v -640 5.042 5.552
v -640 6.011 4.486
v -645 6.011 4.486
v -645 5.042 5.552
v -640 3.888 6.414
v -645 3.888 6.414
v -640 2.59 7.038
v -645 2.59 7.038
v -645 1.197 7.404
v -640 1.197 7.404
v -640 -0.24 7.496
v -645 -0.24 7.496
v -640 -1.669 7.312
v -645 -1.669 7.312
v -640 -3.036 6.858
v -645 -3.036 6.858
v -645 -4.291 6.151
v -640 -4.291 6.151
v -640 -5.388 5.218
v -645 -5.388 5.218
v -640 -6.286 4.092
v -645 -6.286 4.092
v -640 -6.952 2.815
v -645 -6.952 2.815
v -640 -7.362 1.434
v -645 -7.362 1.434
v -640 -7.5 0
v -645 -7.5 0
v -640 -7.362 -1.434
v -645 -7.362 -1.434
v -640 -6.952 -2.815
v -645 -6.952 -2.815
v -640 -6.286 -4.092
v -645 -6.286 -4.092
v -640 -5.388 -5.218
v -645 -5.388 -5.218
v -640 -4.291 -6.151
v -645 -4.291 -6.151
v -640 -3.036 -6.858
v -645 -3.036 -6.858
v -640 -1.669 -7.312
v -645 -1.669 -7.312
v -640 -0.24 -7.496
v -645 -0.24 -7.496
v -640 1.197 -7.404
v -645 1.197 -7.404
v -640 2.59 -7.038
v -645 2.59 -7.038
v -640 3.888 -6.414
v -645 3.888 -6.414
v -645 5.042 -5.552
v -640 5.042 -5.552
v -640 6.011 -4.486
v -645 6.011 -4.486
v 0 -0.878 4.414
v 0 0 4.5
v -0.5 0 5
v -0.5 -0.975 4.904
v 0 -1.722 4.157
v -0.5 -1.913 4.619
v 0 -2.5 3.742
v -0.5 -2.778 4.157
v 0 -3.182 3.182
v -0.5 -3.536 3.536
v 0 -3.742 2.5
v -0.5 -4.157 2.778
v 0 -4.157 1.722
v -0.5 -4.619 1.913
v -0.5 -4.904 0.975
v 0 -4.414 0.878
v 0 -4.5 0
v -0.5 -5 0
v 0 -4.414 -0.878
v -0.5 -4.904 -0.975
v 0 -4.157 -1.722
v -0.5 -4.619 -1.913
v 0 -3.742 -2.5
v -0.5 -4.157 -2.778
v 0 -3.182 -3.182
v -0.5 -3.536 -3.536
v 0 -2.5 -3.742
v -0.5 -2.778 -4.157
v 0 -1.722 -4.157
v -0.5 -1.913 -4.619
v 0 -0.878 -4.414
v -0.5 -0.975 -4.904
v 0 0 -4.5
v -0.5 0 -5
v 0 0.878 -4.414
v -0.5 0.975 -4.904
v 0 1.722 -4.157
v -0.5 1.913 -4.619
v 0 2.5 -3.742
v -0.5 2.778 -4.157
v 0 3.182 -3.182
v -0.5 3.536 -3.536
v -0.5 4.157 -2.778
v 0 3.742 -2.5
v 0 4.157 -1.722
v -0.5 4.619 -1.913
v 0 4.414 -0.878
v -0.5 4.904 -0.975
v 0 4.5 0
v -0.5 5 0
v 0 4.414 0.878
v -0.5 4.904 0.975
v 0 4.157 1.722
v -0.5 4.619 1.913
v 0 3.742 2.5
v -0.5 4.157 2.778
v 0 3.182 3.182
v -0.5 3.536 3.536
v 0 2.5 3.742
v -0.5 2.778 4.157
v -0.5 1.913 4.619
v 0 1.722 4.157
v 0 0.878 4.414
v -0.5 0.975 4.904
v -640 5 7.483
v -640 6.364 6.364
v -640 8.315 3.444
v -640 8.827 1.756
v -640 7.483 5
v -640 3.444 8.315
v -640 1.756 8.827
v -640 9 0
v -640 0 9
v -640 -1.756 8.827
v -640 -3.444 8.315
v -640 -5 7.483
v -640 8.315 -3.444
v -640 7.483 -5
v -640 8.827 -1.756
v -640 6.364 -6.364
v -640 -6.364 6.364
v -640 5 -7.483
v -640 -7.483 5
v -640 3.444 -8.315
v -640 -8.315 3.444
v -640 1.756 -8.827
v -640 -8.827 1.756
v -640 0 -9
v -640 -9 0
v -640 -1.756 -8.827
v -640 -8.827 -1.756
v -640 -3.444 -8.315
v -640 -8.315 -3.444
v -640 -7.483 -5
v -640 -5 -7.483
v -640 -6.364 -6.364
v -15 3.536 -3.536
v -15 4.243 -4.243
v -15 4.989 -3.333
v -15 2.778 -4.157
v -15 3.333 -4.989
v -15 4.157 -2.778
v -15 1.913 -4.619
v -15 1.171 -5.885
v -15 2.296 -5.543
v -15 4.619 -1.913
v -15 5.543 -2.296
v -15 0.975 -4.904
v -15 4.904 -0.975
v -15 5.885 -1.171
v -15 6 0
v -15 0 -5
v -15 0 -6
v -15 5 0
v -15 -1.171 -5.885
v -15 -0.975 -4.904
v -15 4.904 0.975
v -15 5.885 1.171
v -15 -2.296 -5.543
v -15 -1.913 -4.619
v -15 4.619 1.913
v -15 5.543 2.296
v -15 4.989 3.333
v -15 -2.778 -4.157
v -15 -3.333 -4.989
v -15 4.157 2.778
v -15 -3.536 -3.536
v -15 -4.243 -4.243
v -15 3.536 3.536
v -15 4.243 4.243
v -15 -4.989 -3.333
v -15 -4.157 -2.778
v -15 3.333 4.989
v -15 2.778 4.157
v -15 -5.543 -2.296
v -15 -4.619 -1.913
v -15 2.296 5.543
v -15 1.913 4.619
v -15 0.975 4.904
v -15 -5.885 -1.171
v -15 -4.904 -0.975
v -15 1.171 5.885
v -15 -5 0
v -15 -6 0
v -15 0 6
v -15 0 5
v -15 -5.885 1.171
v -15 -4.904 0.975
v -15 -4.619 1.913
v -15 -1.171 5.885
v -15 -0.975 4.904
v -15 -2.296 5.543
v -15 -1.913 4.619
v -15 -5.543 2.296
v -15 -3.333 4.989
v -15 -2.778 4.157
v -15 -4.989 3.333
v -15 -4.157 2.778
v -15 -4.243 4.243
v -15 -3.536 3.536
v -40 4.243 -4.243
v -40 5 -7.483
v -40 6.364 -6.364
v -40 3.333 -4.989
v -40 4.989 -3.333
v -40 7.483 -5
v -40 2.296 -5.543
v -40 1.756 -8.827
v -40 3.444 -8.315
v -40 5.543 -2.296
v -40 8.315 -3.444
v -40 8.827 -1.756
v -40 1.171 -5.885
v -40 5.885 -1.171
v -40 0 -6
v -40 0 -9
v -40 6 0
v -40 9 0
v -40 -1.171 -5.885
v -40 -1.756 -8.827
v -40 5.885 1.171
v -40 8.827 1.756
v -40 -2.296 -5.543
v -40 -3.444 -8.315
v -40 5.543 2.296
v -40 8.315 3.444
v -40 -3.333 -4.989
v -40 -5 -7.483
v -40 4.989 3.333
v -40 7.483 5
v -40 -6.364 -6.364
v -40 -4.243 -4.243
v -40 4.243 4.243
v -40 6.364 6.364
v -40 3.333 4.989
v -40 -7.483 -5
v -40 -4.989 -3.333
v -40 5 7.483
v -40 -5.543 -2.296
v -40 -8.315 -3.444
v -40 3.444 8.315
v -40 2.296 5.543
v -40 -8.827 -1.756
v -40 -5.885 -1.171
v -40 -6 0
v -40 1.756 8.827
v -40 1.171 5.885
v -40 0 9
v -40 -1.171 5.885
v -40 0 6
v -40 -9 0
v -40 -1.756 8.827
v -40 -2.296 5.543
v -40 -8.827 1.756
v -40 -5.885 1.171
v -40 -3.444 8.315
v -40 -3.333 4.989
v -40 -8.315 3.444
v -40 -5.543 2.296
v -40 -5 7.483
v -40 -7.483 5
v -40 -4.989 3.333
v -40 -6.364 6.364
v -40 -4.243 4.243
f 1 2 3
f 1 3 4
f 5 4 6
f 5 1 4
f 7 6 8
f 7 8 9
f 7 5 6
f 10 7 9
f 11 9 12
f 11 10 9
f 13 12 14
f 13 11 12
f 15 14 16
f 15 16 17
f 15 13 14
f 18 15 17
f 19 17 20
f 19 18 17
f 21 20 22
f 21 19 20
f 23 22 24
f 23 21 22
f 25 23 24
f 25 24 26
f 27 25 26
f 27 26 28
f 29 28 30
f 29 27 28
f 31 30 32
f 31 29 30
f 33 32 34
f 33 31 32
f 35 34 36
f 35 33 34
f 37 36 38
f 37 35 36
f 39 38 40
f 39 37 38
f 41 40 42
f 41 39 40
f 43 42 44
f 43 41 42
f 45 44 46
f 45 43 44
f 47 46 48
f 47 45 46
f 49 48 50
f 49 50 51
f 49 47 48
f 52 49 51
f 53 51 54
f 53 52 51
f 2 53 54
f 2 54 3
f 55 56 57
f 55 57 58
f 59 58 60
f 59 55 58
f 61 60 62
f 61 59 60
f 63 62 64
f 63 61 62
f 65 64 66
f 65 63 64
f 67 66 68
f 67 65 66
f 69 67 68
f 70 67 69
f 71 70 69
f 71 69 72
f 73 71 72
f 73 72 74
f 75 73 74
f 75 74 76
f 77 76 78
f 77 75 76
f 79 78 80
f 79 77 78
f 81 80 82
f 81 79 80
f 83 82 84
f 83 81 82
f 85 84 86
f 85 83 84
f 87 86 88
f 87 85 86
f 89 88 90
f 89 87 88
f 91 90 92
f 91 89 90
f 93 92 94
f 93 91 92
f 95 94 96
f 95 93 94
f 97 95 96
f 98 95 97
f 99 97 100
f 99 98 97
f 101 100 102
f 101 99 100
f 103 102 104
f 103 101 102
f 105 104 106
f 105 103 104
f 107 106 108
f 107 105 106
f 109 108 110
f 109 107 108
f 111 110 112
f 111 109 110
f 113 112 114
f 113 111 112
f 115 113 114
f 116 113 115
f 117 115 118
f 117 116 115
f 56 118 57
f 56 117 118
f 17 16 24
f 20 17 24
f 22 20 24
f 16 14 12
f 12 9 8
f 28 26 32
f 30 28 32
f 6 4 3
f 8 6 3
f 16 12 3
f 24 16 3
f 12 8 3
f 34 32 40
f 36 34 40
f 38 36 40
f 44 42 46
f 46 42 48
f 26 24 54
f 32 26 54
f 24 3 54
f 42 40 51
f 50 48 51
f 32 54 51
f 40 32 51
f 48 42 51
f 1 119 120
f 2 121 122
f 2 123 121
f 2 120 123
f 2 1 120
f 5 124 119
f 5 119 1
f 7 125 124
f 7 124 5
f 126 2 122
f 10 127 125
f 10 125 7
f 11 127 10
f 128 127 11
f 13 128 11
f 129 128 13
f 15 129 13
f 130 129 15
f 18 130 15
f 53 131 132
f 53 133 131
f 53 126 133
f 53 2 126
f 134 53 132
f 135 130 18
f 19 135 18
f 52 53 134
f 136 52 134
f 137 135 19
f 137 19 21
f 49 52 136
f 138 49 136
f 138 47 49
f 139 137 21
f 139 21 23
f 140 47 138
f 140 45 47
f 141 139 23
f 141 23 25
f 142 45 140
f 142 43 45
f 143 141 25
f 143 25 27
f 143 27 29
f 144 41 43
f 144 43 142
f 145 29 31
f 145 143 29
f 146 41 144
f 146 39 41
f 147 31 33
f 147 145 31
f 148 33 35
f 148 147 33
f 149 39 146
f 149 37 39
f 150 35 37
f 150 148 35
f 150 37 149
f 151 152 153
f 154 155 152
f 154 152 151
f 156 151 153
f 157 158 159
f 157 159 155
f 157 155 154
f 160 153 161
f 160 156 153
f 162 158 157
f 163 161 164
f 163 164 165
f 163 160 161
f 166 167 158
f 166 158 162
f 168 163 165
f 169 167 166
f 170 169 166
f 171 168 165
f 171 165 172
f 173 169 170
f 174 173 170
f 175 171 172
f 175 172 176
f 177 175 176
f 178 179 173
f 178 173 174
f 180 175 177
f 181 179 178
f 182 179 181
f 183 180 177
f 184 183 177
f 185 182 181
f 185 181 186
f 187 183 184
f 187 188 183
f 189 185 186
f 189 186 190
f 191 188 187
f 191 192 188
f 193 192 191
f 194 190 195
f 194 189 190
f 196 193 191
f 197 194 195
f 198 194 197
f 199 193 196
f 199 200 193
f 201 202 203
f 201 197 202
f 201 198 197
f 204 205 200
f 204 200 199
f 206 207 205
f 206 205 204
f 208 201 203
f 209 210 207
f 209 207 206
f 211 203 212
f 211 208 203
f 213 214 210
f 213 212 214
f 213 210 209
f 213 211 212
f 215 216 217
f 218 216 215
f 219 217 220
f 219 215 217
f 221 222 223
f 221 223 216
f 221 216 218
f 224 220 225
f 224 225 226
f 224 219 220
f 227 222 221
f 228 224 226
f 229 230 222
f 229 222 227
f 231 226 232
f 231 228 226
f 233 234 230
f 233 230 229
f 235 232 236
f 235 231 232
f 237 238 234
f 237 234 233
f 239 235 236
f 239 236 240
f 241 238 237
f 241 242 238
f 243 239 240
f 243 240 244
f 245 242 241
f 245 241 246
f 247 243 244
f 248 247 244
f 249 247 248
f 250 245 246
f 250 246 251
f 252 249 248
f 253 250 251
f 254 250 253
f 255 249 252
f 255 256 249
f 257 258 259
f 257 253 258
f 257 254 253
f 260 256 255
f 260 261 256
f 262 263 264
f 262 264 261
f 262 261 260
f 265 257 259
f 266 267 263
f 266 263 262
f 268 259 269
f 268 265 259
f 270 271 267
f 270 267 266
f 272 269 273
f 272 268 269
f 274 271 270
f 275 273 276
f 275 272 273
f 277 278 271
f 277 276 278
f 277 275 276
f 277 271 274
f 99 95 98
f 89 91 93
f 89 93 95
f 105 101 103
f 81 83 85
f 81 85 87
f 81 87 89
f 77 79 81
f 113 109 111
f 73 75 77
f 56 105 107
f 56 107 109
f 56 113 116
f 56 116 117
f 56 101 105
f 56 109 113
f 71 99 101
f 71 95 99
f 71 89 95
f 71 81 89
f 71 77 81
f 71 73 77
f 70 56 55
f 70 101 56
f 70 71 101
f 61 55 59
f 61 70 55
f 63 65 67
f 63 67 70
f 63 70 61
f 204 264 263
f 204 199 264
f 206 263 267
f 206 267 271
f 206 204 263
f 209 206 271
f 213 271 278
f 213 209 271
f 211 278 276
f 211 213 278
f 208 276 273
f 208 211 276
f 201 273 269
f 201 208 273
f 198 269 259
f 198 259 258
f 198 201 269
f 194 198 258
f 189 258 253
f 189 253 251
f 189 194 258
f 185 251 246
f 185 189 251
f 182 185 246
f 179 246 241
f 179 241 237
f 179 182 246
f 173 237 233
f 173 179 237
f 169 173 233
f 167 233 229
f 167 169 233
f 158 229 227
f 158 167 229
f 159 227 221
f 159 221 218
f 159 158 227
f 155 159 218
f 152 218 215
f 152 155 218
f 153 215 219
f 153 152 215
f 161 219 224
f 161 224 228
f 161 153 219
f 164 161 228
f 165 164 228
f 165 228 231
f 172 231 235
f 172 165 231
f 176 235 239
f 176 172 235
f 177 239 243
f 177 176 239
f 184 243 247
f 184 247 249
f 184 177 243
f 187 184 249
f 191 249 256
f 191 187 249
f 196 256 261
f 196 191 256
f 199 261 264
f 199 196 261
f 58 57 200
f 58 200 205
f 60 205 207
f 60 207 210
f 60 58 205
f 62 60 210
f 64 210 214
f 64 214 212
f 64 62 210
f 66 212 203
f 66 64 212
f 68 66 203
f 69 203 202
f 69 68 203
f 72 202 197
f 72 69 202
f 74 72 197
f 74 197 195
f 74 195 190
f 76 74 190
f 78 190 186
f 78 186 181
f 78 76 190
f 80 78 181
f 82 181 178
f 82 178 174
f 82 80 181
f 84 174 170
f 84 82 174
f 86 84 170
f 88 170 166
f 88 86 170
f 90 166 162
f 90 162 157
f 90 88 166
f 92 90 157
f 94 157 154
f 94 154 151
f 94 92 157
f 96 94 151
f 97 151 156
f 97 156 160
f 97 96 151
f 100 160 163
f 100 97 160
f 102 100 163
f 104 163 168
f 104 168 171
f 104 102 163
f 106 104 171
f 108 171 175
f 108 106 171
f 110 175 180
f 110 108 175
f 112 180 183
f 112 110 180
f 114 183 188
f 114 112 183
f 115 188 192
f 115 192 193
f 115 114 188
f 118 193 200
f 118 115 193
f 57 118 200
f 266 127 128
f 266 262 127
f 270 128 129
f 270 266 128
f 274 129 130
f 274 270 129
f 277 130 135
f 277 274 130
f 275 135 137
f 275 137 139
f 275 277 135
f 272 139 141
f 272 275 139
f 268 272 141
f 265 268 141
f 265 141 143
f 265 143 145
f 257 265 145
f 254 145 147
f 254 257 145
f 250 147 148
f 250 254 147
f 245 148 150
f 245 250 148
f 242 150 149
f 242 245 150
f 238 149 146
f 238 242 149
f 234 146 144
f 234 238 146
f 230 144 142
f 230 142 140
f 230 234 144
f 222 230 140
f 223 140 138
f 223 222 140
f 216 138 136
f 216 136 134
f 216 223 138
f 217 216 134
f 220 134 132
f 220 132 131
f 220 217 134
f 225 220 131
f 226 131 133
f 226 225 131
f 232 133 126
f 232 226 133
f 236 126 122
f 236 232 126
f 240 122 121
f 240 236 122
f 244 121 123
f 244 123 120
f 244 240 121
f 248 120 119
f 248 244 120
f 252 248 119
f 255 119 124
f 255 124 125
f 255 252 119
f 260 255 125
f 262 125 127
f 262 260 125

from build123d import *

# Parameters (mm, degrees)
CHAMFER1_SIZE       = 0.5
BOSS_EXTRUDE1_DEPTH = 5


with BuildPart() as part:
    # Sketch1 → Revolve1 (revolve)
    with BuildSketch(Plane.XY, mode=Mode.PRIVATE) as revolve1_sk:
        Polygon((0, 0), (-640, 0), (-640, 9), (-40, 9), (-40, 6), (-15, 6), (-15, 5), (0, 5), align=None)
    revolve(revolve1_sk.sketch.rotate(Axis((-640, 0, 0), (1, 0, 0)), 90), axis=Axis((-640, 0, 0), (1, 0, 0)))

    # Chamfer1
    chamfer1_edges = [part.edges().sort_by_distance(p)[0] for p in [
        (0, 0, -5),
    ]]
    chamfer(chamfer1_edges, length=CHAMFER1_SIZE)

    # Sketch2 → Boss-Extrude1 (add)
    with BuildSketch(Plane.ZY.offset(640)):
        with BuildLine():
            Line((-4.485716723, 6.010685941), (4.485716723, 6.010685941))
            ThreePointArc((4.485716723, 6.010685941), (0, -7.5), (-4.485716723, 6.010685941))
        make_face()
    extrude(amount=BOSS_EXTRUDE1_DEPTH)


solid = part.part
